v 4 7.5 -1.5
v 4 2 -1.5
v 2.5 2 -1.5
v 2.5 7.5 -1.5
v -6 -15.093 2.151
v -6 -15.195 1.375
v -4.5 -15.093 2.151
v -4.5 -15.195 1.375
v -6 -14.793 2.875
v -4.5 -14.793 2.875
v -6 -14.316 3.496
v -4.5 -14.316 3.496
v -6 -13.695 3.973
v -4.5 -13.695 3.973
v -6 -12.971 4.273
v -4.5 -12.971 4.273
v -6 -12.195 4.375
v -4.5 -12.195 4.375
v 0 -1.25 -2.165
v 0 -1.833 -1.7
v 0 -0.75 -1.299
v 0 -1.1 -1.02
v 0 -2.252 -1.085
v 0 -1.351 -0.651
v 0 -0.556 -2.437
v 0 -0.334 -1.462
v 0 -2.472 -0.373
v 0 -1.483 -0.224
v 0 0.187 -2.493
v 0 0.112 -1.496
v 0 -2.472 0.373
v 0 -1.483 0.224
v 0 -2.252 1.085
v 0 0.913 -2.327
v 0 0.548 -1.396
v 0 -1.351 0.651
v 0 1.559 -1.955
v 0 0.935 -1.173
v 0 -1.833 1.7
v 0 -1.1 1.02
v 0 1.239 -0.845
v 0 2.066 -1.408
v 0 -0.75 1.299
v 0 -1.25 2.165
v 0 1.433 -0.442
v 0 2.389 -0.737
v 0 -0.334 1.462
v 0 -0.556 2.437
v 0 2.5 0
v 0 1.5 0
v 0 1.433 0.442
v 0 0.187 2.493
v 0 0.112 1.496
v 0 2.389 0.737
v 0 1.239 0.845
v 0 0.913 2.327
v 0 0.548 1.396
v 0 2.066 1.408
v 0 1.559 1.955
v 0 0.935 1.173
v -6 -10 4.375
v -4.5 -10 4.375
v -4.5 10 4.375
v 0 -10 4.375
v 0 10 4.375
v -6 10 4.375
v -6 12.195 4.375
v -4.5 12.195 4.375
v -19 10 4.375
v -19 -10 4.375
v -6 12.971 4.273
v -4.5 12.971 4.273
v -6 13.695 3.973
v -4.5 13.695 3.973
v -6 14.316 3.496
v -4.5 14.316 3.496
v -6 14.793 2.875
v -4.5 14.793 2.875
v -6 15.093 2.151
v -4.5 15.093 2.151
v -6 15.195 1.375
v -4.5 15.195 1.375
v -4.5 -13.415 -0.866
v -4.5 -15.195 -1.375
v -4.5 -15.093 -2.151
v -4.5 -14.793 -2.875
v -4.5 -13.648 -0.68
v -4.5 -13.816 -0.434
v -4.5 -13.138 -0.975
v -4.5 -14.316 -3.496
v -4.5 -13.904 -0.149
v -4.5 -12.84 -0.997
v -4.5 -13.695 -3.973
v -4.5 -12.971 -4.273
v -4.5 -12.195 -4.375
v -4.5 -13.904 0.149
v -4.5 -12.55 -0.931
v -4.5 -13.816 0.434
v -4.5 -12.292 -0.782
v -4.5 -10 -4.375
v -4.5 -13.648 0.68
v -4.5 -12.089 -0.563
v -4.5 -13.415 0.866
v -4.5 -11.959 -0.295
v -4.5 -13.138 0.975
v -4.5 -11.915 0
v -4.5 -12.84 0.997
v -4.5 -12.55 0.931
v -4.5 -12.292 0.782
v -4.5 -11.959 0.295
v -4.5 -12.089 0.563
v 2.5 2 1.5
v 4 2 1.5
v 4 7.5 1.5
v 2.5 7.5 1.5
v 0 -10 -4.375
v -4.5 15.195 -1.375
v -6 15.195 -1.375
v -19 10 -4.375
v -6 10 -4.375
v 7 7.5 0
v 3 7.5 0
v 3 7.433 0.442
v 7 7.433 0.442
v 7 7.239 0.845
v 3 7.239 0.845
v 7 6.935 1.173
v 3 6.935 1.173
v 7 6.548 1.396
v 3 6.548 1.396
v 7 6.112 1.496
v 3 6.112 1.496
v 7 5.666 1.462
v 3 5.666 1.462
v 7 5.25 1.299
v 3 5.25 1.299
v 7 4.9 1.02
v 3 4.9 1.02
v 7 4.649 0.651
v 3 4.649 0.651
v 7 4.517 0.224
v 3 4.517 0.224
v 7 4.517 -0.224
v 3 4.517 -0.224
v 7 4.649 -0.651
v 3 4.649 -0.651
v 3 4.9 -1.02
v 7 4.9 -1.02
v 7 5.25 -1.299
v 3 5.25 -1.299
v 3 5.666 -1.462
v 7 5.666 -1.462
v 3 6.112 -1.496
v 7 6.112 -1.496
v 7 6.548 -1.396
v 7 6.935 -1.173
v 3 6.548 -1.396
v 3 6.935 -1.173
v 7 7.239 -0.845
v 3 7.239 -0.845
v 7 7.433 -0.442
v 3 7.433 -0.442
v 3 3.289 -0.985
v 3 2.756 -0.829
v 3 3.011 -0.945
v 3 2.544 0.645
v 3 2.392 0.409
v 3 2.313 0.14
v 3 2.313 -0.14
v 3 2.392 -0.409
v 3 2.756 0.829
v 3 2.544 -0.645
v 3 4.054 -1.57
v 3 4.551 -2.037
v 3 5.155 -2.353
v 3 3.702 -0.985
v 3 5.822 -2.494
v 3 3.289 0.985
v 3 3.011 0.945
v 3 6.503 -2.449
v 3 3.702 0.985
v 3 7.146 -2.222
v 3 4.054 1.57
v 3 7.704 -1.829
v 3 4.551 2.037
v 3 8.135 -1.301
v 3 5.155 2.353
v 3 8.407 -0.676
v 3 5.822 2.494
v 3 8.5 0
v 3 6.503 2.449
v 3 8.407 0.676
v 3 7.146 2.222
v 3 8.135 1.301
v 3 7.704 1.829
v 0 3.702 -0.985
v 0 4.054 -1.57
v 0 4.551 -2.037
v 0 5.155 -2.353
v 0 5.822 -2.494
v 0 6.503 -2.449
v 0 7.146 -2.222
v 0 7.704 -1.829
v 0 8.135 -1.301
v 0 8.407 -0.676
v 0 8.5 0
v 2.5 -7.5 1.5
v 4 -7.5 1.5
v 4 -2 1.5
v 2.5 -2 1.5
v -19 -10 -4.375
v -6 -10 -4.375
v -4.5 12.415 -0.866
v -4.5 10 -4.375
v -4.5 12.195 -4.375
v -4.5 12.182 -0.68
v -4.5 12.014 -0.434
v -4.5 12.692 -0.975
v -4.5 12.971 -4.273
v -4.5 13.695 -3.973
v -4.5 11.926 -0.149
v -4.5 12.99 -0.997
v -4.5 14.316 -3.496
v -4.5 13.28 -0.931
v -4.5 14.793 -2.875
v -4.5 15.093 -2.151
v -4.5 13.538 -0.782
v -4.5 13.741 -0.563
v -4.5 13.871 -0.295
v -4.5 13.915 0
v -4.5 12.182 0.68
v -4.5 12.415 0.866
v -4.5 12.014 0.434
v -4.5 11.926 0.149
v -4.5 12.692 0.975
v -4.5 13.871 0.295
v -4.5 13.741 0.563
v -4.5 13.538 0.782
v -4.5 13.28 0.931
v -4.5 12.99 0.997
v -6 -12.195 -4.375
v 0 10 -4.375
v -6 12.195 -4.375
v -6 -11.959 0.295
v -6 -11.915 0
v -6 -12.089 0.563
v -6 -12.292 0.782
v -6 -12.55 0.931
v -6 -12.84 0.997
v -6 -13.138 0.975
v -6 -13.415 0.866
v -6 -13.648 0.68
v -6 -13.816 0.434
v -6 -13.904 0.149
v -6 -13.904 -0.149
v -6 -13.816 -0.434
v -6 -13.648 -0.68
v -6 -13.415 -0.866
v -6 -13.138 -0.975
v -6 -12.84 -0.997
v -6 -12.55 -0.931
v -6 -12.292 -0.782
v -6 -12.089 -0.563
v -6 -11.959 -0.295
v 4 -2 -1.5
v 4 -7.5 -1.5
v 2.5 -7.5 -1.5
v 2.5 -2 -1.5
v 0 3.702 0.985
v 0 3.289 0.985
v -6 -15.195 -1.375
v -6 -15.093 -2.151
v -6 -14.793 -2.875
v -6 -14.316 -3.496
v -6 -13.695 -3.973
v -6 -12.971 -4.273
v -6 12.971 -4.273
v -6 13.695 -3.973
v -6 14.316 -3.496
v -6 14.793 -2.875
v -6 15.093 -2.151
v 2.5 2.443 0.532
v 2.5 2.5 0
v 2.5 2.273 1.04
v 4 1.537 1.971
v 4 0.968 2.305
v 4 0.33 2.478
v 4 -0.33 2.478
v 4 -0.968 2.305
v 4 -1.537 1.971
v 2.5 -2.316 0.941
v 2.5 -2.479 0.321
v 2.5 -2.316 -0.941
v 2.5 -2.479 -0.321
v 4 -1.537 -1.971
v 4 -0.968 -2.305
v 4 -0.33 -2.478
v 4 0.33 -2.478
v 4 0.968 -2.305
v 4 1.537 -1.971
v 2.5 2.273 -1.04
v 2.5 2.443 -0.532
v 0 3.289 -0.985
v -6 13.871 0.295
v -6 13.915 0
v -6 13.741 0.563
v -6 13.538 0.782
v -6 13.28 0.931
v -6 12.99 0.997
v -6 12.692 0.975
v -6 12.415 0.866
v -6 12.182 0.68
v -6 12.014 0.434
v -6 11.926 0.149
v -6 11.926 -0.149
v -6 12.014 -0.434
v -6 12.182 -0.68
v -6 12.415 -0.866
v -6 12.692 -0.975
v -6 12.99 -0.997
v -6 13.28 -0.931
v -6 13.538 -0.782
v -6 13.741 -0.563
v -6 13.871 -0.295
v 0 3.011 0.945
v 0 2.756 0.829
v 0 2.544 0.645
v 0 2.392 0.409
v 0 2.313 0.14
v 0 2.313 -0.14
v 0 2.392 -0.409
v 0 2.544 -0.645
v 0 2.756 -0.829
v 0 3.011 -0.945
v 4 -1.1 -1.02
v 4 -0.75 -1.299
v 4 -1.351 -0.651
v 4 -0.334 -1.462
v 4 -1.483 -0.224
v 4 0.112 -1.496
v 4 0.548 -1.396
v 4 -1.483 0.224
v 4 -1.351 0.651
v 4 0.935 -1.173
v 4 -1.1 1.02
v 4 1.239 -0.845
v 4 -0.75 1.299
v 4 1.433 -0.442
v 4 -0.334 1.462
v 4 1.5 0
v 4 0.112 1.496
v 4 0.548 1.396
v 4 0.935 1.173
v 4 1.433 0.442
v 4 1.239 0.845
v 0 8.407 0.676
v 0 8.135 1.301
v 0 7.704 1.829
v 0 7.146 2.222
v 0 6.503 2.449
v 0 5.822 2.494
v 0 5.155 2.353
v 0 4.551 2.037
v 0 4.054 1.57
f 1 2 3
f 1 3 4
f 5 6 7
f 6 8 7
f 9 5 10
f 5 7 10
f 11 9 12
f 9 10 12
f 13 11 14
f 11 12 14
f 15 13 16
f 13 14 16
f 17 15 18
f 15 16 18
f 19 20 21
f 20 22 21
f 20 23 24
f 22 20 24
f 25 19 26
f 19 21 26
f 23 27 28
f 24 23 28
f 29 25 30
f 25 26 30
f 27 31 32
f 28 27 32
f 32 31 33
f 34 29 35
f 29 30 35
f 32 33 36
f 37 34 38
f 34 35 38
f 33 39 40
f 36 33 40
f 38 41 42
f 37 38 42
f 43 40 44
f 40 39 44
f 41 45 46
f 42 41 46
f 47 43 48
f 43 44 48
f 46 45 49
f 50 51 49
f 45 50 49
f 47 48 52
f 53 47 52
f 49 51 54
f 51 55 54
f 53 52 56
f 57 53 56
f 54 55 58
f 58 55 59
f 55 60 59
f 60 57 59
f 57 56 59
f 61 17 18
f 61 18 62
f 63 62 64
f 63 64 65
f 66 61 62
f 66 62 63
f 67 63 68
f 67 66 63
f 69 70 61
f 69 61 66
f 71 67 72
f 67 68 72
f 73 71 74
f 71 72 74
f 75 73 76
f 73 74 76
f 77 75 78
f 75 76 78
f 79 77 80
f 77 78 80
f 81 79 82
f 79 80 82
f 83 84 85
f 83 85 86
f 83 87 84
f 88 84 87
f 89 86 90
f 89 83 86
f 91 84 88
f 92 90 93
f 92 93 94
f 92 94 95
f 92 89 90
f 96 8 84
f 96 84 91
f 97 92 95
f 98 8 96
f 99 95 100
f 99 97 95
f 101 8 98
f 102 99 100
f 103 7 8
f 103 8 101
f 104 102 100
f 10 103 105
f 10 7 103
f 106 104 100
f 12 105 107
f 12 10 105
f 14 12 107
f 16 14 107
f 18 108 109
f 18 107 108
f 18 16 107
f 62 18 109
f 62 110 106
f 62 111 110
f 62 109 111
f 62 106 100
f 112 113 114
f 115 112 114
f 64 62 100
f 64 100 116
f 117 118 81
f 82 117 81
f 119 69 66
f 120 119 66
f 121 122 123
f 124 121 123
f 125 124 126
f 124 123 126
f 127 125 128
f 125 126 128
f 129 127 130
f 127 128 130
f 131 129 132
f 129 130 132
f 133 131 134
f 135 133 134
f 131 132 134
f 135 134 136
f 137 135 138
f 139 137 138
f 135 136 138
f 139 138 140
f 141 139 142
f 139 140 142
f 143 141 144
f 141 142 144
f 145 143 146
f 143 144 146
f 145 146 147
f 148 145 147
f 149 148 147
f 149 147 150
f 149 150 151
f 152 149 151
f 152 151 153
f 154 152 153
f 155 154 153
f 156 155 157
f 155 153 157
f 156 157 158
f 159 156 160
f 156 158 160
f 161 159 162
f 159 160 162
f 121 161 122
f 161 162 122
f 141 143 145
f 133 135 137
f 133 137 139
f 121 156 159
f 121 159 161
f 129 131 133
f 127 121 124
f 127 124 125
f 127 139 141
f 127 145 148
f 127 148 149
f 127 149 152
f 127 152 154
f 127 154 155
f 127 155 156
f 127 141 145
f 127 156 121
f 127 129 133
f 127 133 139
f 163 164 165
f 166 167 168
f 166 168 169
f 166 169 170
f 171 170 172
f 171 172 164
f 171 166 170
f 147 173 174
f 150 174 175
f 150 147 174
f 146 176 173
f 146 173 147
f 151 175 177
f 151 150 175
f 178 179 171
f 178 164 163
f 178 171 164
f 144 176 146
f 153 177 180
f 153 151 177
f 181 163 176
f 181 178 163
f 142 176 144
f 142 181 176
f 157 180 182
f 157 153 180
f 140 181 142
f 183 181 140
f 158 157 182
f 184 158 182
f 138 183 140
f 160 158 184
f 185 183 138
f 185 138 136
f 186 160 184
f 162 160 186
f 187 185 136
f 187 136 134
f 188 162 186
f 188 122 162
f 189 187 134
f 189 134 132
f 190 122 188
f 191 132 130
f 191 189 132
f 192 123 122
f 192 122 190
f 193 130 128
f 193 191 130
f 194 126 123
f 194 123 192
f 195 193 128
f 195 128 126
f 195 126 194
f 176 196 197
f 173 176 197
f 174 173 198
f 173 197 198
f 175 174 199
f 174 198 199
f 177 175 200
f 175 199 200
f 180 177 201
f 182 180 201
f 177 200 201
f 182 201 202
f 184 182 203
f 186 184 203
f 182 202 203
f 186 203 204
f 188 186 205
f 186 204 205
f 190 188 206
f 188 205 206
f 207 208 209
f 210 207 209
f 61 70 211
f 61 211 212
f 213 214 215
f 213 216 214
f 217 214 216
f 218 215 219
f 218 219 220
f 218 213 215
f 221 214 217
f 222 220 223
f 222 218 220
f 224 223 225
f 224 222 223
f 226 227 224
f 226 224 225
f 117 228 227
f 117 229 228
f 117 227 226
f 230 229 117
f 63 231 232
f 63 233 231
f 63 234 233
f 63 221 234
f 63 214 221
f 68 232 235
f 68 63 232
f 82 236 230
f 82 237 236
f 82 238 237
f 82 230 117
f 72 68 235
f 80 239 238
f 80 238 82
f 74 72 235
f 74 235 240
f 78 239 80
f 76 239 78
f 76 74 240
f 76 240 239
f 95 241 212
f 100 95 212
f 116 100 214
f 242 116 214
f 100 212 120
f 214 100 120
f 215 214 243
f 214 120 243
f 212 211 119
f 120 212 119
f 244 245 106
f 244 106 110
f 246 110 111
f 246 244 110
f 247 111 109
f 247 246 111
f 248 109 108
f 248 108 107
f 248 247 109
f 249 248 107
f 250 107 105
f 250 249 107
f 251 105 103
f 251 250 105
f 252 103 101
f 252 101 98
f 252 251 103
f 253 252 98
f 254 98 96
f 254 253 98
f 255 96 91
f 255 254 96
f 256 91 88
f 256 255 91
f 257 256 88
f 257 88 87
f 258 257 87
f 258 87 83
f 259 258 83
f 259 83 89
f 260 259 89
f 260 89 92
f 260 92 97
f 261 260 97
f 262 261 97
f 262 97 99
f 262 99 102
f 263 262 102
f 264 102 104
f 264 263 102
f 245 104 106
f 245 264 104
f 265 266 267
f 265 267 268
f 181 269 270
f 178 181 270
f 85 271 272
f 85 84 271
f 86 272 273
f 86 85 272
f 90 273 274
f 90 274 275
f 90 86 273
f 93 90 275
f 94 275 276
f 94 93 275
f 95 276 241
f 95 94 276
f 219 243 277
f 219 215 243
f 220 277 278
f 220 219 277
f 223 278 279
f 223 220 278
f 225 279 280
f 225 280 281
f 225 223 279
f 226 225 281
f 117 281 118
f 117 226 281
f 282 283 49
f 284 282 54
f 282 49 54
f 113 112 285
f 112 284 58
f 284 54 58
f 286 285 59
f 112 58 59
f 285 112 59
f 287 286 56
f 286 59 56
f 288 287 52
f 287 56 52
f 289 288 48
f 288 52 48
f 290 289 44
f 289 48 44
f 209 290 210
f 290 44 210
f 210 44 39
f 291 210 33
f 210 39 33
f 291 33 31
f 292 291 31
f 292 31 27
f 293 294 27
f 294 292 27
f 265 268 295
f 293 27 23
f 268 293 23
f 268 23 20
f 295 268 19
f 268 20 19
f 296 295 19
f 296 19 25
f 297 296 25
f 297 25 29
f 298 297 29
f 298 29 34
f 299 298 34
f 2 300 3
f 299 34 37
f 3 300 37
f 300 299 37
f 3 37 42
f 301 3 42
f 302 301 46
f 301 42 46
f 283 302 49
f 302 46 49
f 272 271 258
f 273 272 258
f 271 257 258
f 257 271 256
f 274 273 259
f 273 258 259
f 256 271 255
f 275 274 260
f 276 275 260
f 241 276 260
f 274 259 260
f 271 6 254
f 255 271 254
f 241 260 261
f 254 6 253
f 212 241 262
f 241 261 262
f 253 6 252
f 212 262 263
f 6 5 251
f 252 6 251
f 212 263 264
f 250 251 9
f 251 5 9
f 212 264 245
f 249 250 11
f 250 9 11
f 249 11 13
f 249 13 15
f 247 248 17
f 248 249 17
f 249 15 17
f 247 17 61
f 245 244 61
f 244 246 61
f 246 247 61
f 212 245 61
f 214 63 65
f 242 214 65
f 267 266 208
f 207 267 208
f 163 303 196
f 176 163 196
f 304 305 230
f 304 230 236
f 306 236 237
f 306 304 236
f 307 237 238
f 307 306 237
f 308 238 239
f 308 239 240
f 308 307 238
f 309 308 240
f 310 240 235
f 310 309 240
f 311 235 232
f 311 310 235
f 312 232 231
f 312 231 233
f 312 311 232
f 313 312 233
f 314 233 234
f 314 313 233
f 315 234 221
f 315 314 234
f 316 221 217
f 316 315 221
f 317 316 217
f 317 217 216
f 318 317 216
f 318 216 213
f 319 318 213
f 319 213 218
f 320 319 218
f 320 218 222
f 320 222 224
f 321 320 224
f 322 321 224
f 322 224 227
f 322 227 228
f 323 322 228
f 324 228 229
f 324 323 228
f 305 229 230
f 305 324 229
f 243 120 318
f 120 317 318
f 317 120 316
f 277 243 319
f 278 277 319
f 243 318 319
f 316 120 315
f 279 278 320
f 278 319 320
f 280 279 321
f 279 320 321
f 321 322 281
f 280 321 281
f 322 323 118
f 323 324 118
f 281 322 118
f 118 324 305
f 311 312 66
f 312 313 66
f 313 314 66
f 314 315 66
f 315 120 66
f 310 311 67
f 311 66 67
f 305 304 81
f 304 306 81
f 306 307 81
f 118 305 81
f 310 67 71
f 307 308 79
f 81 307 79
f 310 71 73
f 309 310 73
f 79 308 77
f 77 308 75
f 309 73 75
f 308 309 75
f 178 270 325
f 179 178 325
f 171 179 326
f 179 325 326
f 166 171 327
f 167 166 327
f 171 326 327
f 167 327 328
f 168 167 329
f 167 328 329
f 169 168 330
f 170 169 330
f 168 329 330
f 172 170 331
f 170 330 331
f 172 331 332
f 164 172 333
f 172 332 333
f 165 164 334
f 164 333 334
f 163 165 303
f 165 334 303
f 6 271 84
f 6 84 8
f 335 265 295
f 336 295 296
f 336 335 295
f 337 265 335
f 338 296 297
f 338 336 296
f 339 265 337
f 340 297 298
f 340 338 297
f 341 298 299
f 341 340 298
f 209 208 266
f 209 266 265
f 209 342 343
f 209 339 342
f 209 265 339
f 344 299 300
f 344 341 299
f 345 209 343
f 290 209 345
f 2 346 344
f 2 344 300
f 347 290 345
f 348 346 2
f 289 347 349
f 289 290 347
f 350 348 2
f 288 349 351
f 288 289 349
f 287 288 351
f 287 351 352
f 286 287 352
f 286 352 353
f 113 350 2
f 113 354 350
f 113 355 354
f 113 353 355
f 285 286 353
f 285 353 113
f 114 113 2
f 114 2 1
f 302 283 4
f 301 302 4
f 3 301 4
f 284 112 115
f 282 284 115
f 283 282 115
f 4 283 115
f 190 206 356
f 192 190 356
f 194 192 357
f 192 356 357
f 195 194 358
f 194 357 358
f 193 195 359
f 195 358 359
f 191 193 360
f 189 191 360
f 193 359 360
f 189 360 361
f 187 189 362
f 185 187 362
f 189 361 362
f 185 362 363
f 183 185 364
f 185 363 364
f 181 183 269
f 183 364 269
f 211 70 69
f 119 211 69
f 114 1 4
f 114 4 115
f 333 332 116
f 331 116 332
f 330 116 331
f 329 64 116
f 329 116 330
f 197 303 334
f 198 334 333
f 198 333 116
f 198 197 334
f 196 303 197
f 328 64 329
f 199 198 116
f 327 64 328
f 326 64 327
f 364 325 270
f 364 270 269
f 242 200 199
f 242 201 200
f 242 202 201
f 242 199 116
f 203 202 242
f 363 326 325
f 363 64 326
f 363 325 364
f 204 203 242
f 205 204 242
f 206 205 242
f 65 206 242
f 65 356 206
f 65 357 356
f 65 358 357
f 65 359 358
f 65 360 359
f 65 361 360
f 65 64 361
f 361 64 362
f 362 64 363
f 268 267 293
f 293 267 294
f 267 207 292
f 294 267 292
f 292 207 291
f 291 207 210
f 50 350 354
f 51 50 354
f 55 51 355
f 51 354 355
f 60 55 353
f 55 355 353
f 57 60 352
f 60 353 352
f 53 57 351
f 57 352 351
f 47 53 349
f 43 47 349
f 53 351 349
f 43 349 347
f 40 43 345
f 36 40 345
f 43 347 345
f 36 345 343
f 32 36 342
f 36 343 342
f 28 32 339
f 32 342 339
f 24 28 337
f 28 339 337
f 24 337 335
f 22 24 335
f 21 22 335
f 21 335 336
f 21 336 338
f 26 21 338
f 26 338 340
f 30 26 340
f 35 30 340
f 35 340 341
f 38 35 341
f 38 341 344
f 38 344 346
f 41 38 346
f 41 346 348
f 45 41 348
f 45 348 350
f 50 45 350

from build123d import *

# Parameters (mm, degrees)
F0_W      = 19
F0_H      = 20
F1_DEPTH  = 4.375
F3_W      = 30.39
F3_H      = 8.75
F3_R      = 1
F4_DEPTH  = 1.5
F6_DEPTH  = 3
F7_R      = 1.5
F8_DEPTH  = 4
F9_R      = 2.5
F10_DEPTH = 4
F12_W     = 15
F12_H     = 3
F13_DEPTH = 1.5
F11_R     = 1.5
F14_DEPTH = 25
F15_R     = 3


with BuildPart() as f1:
    # F0 (on Top) → F1 (new body, symmetric)
    with BuildSketch(Plane.XY):
        with Locations((-9.5, 0)):
            Rectangle(F0_W, F0_H)
    extrude(amount=F1_DEPTH, both=True)

    # F3 (on offset) → F4 (join)
    with BuildSketch(Plane.YZ.offset(-6)):
        Rectangle(F3_W, F3_H)
        with Locations((-12.915, 0)):
            Circle(F3_R, mode=Mode.SUBTRACT)
        with Locations((12.915, 0)):
            Circle(F3_R, mode=Mode.SUBTRACT)
    extrude(amount=F4_DEPTH)

    # F5 (on face) → F6 (join)
    with BuildSketch(Plane.YZ):
        with BuildLine():
            ThreePointArc((3.702386301, -0.9853787547), (6.5029740314, -2.44888079), (8.5, 0))
            ThreePointArc((8.5, 0), (6.5029740314, 2.44888079), (3.702386301, 0.9853787547))
            ThreePointArc((3.702386301, 0.9853787547), (3.5, 0), (3.702386301, -0.9853787547))
        make_face()
        with BuildLine():
            ThreePointArc((3.702386301, -0.9853787547), (3.5, 0), (3.702386301, 0.9853787547))
            Line((3.702386301, 0.9853787547), (3.2885346007, 0.9853787547))
            ThreePointArc((3.2885346007, 0.9853787547), (2.303155846, 0), (3.2885346007, -0.9853787547))
            Line((3.2885346007, -0.9853787547), (3.702386301, -0.9853787547))
        make_face()
    extrude(amount=F6_DEPTH)

    # F7 (on face) → F8 (join)
    with BuildSketch(Plane.YZ.offset(3)):
        with Locations((6, 0)):
            Circle(F7_R)
    extrude(amount=F8_DEPTH)

    # F15
    f15_edges = [f1.edges().sort_by_distance(p)[0] for p in [
        (-5.25, -15.195, -4.375),
        (-5.25, -15.195, 4.375),
        (-5.25, 15.195, -4.375),
        (-5.25, 15.195, 4.375),
    ]]
    fillet(f15_edges, radius=F15_R)


with BuildPart() as f10:
    # F9 (on Right) → F10 (new body)
    with BuildSketch(Plane.YZ):
        Circle(F9_R)
    extrude(amount=F10_DEPTH)

    # F12 (on face) → F13 (join)
    with BuildSketch(Plane.YZ.offset(4)):
        Rectangle(F12_W, F12_H)
    extrude(amount=-F13_DEPTH)

    # F11 (on face) → F14 (cut)
    with BuildSketch(Plane.YZ.offset(4)):
        Circle(F11_R)
    extrude(amount=-F14_DEPTH, mode=Mode.SUBTRACT)


solid = Compound([f1.part, f10.part])
